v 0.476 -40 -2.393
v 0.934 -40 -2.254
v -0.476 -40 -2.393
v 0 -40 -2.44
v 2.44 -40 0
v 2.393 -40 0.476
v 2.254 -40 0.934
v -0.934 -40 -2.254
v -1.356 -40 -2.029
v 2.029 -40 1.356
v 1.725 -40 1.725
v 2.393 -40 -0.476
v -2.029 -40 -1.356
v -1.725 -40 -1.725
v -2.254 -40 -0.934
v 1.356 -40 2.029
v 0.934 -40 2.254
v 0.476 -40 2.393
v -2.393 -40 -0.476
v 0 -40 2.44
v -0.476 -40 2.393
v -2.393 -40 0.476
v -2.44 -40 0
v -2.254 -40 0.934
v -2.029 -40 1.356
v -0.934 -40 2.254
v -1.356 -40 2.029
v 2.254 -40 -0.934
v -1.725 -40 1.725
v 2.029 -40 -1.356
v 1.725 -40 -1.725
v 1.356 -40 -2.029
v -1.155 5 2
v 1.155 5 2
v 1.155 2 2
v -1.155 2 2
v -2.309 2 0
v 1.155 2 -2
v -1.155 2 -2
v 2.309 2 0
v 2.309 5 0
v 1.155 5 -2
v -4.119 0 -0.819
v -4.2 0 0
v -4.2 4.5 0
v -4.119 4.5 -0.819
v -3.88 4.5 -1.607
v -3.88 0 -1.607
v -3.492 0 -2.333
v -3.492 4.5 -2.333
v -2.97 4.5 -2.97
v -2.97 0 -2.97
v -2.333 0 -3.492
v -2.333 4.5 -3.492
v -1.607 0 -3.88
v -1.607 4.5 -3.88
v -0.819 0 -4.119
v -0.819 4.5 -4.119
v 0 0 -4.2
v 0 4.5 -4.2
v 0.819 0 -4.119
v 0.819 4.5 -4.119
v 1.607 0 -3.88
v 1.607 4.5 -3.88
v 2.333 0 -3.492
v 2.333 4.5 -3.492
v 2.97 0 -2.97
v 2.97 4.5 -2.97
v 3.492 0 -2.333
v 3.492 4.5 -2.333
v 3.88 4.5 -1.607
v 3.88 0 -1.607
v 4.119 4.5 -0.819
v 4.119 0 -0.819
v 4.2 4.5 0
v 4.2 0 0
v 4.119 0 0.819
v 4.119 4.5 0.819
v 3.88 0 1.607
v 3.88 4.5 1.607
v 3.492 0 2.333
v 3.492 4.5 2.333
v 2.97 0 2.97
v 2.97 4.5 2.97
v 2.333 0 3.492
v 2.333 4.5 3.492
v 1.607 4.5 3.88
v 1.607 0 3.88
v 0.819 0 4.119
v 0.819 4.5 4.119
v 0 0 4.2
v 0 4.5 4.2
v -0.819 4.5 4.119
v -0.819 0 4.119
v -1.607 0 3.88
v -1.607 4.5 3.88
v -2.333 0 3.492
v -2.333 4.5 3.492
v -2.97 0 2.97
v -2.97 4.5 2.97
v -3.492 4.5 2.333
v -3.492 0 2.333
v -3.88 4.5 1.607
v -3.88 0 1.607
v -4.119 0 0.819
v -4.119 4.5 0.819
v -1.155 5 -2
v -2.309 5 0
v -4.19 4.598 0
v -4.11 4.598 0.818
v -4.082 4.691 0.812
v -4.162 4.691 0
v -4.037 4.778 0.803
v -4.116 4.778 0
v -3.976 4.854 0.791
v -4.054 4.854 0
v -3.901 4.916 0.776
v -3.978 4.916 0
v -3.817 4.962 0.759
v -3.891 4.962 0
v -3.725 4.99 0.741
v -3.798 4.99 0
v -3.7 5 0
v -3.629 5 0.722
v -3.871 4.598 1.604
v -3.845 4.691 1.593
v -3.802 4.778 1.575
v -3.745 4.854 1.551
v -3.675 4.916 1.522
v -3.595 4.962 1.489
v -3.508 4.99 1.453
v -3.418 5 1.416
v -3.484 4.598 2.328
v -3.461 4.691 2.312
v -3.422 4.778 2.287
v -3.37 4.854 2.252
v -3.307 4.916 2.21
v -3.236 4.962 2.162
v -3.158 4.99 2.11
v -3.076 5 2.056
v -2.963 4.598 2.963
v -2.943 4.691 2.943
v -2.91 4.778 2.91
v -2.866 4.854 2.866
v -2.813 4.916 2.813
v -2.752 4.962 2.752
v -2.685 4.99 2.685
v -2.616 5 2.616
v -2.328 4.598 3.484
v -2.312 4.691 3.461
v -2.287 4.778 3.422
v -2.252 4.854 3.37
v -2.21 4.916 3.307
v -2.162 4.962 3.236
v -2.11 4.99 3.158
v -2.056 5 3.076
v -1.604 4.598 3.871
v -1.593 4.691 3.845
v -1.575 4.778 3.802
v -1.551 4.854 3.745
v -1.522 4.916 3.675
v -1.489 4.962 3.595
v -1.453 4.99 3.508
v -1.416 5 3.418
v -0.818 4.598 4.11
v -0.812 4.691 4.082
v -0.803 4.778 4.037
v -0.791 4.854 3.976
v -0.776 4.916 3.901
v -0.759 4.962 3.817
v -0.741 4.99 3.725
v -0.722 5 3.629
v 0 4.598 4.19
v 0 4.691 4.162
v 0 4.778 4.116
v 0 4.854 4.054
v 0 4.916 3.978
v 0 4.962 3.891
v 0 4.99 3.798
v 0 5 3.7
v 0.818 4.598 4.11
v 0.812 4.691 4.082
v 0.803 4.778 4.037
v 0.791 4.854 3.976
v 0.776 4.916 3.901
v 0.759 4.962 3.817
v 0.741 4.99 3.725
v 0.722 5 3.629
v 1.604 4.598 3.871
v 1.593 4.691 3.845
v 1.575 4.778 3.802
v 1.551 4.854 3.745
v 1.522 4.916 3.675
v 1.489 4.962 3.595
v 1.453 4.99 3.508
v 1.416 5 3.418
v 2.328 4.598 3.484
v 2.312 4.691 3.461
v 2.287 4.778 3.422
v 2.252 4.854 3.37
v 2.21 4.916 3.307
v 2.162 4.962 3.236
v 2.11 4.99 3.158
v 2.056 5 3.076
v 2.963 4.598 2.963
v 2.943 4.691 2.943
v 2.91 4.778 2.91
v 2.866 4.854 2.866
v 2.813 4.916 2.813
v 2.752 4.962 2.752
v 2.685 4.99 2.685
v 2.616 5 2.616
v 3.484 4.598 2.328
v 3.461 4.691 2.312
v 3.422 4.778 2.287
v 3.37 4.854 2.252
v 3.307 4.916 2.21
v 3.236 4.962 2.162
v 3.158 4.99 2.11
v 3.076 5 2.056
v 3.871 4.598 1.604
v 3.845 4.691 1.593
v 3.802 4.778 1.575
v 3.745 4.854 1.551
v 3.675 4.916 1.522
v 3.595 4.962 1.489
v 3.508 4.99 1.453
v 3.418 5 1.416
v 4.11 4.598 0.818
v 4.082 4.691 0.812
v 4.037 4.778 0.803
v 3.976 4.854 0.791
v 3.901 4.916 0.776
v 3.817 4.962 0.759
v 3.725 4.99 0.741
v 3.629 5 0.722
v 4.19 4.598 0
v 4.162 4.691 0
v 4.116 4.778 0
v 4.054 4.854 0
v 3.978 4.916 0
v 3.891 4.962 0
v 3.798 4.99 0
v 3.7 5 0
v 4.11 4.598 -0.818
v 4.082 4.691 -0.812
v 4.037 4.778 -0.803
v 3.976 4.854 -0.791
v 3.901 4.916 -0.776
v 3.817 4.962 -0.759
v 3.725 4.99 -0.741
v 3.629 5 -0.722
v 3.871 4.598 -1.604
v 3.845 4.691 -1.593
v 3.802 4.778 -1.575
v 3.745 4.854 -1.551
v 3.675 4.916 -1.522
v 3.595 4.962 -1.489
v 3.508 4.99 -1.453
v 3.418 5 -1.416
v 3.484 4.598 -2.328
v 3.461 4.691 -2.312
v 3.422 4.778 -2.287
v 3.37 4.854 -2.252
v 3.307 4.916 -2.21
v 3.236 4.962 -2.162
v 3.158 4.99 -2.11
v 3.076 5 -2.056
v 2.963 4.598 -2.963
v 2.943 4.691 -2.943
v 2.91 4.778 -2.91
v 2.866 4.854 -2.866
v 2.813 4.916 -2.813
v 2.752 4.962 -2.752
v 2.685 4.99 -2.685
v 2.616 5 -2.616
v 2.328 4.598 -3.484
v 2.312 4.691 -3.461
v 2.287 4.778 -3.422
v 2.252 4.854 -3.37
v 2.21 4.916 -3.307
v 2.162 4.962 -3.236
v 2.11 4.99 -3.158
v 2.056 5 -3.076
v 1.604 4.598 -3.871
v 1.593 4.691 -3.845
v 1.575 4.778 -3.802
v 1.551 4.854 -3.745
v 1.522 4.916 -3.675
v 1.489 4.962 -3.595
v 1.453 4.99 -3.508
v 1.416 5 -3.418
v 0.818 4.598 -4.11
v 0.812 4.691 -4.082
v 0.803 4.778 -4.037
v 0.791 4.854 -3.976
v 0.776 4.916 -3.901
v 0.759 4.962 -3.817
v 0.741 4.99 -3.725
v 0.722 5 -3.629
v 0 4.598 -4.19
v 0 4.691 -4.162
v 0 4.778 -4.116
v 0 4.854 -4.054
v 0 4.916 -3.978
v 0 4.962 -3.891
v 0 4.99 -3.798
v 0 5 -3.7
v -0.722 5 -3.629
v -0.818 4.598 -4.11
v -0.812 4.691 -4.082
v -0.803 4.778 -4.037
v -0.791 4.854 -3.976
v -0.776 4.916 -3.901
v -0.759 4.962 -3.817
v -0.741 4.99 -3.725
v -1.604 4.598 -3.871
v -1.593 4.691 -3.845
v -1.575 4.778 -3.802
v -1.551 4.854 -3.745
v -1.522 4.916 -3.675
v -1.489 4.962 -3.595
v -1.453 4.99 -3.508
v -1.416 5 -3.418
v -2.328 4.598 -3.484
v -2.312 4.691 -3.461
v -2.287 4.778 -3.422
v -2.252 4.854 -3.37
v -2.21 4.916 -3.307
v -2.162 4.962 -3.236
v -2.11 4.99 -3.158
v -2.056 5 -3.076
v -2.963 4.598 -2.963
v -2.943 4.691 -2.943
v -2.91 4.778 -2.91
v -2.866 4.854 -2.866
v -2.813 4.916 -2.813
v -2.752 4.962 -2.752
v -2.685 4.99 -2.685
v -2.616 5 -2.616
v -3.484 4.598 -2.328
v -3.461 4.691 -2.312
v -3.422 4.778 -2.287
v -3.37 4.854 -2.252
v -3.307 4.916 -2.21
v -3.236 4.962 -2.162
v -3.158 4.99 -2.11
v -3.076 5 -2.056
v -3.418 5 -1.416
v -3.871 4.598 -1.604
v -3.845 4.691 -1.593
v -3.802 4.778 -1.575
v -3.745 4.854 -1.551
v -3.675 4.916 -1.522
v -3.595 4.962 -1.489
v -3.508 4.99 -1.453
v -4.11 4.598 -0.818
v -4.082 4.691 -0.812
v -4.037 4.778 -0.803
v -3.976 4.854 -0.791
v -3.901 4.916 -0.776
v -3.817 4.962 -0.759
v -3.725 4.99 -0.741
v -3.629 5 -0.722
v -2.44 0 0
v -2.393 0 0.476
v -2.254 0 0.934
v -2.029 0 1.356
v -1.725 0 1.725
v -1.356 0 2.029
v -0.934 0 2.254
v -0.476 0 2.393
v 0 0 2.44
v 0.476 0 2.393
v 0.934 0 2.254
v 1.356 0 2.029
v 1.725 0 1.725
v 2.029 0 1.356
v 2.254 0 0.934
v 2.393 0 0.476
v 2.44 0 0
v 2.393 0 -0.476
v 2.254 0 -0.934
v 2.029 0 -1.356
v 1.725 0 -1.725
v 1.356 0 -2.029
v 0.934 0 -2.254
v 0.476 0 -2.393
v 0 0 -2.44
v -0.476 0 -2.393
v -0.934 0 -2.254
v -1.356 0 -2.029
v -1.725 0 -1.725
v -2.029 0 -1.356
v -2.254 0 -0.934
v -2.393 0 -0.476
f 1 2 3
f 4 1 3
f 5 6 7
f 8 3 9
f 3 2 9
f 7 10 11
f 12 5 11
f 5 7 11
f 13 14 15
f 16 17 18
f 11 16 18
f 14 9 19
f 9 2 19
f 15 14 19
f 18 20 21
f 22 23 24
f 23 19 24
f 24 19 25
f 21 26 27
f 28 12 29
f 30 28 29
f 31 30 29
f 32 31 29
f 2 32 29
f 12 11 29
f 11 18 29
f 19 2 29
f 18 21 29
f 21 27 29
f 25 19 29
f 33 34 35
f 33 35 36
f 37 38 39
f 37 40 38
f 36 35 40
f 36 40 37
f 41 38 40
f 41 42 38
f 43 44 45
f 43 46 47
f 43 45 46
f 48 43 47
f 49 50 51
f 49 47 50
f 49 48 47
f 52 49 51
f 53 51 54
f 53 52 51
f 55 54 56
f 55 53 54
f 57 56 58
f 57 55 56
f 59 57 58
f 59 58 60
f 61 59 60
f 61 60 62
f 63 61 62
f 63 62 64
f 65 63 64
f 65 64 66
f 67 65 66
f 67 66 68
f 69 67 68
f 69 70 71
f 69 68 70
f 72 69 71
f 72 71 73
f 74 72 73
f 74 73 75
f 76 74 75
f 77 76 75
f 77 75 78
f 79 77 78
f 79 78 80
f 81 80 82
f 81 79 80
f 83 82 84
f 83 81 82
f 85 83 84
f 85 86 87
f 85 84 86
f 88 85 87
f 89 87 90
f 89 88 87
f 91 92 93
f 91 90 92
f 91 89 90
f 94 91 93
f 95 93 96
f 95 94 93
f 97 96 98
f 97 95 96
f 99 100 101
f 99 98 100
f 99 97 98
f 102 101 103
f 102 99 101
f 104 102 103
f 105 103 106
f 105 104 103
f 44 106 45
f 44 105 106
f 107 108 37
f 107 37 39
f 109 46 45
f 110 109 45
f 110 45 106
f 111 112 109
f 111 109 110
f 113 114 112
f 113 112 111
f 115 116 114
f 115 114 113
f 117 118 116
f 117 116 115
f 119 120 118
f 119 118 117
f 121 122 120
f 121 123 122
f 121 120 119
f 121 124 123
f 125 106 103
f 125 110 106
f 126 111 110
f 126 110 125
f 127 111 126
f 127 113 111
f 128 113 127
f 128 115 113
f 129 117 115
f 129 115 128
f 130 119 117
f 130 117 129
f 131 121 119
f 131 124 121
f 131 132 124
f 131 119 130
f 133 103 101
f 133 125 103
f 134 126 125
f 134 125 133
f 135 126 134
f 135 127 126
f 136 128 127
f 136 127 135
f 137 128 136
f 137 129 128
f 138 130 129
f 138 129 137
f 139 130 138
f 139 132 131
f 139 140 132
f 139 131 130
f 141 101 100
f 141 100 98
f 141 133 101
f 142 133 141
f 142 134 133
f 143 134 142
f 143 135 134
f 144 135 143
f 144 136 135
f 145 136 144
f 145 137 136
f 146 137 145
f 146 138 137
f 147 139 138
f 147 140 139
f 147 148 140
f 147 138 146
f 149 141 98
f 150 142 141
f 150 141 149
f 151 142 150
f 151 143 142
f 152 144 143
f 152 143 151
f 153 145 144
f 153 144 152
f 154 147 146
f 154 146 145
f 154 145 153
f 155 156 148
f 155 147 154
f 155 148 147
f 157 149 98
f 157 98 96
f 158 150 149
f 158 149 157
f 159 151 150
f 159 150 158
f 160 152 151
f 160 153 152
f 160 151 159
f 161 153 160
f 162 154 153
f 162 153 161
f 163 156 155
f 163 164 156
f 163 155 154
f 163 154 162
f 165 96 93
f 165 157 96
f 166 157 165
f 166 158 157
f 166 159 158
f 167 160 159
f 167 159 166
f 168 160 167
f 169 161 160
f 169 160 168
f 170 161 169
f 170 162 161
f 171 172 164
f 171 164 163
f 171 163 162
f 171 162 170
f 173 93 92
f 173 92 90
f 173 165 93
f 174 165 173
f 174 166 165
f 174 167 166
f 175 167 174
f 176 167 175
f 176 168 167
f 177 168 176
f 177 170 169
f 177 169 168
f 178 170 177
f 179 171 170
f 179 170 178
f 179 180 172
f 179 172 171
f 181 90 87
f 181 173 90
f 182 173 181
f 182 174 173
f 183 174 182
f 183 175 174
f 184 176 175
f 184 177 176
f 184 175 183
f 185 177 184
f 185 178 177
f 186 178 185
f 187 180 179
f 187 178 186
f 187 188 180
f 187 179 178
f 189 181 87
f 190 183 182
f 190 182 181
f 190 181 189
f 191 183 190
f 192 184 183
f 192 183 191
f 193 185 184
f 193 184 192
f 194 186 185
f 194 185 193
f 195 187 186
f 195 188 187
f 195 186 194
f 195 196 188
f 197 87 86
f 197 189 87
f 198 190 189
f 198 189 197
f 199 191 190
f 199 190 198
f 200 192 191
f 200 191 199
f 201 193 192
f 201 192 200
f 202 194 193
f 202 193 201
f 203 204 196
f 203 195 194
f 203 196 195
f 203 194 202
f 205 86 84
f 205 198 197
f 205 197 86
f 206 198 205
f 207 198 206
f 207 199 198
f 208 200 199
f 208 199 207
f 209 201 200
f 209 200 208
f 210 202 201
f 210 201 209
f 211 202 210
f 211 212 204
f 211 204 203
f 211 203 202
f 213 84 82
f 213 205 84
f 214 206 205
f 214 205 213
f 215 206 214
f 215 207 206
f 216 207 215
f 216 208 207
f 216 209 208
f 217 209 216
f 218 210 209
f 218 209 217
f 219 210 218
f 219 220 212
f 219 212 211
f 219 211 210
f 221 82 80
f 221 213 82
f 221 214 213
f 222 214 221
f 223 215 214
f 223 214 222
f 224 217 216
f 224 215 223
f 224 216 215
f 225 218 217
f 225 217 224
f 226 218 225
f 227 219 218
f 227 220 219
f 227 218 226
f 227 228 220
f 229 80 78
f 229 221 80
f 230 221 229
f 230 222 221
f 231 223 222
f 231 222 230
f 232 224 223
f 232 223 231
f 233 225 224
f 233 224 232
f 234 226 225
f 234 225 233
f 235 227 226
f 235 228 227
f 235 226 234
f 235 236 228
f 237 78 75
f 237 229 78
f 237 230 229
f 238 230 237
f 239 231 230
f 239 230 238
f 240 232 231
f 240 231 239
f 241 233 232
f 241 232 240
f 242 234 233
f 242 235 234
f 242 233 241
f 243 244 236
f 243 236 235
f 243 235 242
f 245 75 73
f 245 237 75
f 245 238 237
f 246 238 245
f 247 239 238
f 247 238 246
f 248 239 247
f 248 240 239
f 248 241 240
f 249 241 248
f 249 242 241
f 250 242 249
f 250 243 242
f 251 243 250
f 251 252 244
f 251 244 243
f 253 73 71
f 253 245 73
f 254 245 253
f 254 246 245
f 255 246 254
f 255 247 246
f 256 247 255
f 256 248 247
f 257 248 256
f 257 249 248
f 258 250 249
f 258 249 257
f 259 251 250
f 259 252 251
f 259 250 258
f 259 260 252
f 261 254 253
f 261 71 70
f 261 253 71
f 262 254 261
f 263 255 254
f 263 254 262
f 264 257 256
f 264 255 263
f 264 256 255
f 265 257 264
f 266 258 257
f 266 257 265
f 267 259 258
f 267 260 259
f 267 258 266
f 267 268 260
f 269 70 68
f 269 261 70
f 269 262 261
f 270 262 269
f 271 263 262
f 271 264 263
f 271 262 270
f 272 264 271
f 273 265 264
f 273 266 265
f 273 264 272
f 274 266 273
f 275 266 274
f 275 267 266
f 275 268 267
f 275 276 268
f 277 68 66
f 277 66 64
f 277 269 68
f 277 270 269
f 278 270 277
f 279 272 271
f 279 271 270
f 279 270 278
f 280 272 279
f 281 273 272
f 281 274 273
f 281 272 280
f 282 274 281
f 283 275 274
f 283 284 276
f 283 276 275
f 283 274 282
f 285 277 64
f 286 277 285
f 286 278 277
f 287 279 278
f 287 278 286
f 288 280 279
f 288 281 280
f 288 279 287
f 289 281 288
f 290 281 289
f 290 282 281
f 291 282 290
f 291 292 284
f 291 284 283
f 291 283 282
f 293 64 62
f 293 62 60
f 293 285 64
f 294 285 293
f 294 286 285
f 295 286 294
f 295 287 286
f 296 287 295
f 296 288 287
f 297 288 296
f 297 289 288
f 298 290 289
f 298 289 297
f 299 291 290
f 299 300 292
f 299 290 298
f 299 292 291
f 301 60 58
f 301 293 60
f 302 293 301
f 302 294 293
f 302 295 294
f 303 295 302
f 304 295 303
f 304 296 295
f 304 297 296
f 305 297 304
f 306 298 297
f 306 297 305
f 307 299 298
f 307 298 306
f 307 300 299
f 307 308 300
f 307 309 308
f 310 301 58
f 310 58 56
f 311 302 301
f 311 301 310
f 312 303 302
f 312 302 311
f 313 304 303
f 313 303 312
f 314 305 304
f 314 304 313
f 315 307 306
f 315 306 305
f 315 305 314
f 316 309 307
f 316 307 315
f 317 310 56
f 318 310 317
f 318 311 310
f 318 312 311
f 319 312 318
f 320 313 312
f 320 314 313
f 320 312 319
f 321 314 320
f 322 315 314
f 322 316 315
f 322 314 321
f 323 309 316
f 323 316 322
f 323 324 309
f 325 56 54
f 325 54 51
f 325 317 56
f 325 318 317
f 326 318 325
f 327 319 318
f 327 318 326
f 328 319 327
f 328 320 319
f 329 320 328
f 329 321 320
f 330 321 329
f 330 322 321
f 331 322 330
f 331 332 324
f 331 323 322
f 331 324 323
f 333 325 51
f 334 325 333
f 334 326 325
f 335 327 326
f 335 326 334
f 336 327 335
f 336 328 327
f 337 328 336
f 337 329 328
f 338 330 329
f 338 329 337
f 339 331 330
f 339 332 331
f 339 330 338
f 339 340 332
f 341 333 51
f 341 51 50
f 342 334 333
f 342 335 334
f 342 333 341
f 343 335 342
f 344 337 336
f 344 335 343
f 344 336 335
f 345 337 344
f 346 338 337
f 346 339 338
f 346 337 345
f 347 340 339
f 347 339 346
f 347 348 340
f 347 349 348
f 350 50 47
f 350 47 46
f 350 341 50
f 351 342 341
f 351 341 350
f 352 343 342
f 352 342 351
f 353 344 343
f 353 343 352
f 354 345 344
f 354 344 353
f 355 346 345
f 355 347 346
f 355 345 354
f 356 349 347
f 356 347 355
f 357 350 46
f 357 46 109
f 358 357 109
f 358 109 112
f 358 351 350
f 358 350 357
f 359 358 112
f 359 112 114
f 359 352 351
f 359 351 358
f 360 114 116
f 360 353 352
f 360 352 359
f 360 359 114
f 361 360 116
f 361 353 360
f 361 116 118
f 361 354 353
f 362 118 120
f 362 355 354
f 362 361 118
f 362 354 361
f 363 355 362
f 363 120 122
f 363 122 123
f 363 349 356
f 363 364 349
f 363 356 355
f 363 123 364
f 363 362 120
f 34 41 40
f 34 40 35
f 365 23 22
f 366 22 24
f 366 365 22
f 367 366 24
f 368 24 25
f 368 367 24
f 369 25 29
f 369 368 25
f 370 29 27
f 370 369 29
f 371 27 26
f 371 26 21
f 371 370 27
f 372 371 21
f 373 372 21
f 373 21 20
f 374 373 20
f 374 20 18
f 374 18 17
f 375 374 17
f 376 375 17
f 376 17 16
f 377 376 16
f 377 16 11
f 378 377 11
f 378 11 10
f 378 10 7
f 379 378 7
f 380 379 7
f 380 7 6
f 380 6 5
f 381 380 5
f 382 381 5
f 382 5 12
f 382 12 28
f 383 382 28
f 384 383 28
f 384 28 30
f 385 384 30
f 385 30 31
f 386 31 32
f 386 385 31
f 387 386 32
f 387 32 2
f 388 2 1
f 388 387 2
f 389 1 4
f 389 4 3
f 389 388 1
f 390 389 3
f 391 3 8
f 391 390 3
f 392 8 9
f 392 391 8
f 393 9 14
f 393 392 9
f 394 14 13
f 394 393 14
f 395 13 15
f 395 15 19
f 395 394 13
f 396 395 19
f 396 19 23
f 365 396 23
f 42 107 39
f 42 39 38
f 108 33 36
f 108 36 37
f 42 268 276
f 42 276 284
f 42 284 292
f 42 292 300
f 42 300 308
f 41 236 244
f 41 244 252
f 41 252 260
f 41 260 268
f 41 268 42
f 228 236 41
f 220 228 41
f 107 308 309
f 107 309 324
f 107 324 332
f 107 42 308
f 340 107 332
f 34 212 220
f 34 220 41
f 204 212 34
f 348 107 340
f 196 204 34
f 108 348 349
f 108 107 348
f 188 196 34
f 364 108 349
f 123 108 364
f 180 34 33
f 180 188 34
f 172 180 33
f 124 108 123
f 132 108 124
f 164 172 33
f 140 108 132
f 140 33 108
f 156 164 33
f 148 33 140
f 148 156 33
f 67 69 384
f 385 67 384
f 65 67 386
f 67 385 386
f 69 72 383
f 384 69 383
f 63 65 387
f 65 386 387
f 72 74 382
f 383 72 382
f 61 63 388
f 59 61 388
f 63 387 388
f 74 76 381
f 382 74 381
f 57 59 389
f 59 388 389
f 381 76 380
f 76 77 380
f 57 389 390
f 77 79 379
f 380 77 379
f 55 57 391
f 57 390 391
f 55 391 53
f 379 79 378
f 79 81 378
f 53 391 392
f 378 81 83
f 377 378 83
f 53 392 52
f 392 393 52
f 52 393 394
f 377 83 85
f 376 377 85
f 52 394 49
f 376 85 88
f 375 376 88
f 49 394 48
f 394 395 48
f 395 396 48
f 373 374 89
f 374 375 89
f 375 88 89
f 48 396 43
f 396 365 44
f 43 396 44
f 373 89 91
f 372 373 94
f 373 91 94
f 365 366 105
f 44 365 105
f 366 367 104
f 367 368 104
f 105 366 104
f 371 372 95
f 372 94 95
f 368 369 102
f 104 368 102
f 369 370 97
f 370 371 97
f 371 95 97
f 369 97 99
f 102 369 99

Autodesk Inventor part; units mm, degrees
ref_plane "YZ Plane" through (0, 0, 0) normal (1, 0, 0) x (0, 1, 0)
ref_plane "XZ Plane" through (0, 0, 0) normal (0, 1, 0) x (-1, 0, 0)
ref_plane "XY Plane" through (0, 0, 0) normal (0, 0, 1) x (1, 0, 0)
sketch "Sketch1" plane through (0, 0, 0) normal (0, 1, 0) x (-1, 0, 0)
  circle A0 centre (0, 0) radius 2.44
  circle A1 centre (0, 0) radius 4.2
  line L0 (1.1547, -2) -> (-1.1547, -2)
  line L1 (-1.1547, -2) -> (-2.3094, 0)
  line L2 (-2.3094, 0) -> (-1.1547, 2)
  line L3 (-1.1547, 2) -> (1.1547, 2)
  line L4 (1.1547, 2) -> (2.3094, 0)
  line L5 (2.3094, 0) -> (1.1547, -2)
  dimension "d0" = 4.88
  dimension "d1" = 8.4
  dimension "d8" = 4
extrude "Extrusion1" add sketch "Sketch1" along normal blind 5 contours A0 | A1 | L0 L1 L2 L3 L4 L5
extrude "Extrusion2" add sketch "Sketch1" against normal blind 40 contours A0 | L0 L1 L2 L3 L4 L5
extrude "Extrusion3" cut sketch "Sketch1" against normal blind 3 from surface at 5 contours L0 L1 L2 L3 L4 L5
fillet "Fillet1" radius 0.5 1 edges at (4.2, 5, 0)
thread "Thread2" size "M5x0.8" class "6g" standard "ANSI Metric M Profile" full length
equation "\"d4\" = length"
equation "\"length\" = 40"
properties part number "M5x20"
